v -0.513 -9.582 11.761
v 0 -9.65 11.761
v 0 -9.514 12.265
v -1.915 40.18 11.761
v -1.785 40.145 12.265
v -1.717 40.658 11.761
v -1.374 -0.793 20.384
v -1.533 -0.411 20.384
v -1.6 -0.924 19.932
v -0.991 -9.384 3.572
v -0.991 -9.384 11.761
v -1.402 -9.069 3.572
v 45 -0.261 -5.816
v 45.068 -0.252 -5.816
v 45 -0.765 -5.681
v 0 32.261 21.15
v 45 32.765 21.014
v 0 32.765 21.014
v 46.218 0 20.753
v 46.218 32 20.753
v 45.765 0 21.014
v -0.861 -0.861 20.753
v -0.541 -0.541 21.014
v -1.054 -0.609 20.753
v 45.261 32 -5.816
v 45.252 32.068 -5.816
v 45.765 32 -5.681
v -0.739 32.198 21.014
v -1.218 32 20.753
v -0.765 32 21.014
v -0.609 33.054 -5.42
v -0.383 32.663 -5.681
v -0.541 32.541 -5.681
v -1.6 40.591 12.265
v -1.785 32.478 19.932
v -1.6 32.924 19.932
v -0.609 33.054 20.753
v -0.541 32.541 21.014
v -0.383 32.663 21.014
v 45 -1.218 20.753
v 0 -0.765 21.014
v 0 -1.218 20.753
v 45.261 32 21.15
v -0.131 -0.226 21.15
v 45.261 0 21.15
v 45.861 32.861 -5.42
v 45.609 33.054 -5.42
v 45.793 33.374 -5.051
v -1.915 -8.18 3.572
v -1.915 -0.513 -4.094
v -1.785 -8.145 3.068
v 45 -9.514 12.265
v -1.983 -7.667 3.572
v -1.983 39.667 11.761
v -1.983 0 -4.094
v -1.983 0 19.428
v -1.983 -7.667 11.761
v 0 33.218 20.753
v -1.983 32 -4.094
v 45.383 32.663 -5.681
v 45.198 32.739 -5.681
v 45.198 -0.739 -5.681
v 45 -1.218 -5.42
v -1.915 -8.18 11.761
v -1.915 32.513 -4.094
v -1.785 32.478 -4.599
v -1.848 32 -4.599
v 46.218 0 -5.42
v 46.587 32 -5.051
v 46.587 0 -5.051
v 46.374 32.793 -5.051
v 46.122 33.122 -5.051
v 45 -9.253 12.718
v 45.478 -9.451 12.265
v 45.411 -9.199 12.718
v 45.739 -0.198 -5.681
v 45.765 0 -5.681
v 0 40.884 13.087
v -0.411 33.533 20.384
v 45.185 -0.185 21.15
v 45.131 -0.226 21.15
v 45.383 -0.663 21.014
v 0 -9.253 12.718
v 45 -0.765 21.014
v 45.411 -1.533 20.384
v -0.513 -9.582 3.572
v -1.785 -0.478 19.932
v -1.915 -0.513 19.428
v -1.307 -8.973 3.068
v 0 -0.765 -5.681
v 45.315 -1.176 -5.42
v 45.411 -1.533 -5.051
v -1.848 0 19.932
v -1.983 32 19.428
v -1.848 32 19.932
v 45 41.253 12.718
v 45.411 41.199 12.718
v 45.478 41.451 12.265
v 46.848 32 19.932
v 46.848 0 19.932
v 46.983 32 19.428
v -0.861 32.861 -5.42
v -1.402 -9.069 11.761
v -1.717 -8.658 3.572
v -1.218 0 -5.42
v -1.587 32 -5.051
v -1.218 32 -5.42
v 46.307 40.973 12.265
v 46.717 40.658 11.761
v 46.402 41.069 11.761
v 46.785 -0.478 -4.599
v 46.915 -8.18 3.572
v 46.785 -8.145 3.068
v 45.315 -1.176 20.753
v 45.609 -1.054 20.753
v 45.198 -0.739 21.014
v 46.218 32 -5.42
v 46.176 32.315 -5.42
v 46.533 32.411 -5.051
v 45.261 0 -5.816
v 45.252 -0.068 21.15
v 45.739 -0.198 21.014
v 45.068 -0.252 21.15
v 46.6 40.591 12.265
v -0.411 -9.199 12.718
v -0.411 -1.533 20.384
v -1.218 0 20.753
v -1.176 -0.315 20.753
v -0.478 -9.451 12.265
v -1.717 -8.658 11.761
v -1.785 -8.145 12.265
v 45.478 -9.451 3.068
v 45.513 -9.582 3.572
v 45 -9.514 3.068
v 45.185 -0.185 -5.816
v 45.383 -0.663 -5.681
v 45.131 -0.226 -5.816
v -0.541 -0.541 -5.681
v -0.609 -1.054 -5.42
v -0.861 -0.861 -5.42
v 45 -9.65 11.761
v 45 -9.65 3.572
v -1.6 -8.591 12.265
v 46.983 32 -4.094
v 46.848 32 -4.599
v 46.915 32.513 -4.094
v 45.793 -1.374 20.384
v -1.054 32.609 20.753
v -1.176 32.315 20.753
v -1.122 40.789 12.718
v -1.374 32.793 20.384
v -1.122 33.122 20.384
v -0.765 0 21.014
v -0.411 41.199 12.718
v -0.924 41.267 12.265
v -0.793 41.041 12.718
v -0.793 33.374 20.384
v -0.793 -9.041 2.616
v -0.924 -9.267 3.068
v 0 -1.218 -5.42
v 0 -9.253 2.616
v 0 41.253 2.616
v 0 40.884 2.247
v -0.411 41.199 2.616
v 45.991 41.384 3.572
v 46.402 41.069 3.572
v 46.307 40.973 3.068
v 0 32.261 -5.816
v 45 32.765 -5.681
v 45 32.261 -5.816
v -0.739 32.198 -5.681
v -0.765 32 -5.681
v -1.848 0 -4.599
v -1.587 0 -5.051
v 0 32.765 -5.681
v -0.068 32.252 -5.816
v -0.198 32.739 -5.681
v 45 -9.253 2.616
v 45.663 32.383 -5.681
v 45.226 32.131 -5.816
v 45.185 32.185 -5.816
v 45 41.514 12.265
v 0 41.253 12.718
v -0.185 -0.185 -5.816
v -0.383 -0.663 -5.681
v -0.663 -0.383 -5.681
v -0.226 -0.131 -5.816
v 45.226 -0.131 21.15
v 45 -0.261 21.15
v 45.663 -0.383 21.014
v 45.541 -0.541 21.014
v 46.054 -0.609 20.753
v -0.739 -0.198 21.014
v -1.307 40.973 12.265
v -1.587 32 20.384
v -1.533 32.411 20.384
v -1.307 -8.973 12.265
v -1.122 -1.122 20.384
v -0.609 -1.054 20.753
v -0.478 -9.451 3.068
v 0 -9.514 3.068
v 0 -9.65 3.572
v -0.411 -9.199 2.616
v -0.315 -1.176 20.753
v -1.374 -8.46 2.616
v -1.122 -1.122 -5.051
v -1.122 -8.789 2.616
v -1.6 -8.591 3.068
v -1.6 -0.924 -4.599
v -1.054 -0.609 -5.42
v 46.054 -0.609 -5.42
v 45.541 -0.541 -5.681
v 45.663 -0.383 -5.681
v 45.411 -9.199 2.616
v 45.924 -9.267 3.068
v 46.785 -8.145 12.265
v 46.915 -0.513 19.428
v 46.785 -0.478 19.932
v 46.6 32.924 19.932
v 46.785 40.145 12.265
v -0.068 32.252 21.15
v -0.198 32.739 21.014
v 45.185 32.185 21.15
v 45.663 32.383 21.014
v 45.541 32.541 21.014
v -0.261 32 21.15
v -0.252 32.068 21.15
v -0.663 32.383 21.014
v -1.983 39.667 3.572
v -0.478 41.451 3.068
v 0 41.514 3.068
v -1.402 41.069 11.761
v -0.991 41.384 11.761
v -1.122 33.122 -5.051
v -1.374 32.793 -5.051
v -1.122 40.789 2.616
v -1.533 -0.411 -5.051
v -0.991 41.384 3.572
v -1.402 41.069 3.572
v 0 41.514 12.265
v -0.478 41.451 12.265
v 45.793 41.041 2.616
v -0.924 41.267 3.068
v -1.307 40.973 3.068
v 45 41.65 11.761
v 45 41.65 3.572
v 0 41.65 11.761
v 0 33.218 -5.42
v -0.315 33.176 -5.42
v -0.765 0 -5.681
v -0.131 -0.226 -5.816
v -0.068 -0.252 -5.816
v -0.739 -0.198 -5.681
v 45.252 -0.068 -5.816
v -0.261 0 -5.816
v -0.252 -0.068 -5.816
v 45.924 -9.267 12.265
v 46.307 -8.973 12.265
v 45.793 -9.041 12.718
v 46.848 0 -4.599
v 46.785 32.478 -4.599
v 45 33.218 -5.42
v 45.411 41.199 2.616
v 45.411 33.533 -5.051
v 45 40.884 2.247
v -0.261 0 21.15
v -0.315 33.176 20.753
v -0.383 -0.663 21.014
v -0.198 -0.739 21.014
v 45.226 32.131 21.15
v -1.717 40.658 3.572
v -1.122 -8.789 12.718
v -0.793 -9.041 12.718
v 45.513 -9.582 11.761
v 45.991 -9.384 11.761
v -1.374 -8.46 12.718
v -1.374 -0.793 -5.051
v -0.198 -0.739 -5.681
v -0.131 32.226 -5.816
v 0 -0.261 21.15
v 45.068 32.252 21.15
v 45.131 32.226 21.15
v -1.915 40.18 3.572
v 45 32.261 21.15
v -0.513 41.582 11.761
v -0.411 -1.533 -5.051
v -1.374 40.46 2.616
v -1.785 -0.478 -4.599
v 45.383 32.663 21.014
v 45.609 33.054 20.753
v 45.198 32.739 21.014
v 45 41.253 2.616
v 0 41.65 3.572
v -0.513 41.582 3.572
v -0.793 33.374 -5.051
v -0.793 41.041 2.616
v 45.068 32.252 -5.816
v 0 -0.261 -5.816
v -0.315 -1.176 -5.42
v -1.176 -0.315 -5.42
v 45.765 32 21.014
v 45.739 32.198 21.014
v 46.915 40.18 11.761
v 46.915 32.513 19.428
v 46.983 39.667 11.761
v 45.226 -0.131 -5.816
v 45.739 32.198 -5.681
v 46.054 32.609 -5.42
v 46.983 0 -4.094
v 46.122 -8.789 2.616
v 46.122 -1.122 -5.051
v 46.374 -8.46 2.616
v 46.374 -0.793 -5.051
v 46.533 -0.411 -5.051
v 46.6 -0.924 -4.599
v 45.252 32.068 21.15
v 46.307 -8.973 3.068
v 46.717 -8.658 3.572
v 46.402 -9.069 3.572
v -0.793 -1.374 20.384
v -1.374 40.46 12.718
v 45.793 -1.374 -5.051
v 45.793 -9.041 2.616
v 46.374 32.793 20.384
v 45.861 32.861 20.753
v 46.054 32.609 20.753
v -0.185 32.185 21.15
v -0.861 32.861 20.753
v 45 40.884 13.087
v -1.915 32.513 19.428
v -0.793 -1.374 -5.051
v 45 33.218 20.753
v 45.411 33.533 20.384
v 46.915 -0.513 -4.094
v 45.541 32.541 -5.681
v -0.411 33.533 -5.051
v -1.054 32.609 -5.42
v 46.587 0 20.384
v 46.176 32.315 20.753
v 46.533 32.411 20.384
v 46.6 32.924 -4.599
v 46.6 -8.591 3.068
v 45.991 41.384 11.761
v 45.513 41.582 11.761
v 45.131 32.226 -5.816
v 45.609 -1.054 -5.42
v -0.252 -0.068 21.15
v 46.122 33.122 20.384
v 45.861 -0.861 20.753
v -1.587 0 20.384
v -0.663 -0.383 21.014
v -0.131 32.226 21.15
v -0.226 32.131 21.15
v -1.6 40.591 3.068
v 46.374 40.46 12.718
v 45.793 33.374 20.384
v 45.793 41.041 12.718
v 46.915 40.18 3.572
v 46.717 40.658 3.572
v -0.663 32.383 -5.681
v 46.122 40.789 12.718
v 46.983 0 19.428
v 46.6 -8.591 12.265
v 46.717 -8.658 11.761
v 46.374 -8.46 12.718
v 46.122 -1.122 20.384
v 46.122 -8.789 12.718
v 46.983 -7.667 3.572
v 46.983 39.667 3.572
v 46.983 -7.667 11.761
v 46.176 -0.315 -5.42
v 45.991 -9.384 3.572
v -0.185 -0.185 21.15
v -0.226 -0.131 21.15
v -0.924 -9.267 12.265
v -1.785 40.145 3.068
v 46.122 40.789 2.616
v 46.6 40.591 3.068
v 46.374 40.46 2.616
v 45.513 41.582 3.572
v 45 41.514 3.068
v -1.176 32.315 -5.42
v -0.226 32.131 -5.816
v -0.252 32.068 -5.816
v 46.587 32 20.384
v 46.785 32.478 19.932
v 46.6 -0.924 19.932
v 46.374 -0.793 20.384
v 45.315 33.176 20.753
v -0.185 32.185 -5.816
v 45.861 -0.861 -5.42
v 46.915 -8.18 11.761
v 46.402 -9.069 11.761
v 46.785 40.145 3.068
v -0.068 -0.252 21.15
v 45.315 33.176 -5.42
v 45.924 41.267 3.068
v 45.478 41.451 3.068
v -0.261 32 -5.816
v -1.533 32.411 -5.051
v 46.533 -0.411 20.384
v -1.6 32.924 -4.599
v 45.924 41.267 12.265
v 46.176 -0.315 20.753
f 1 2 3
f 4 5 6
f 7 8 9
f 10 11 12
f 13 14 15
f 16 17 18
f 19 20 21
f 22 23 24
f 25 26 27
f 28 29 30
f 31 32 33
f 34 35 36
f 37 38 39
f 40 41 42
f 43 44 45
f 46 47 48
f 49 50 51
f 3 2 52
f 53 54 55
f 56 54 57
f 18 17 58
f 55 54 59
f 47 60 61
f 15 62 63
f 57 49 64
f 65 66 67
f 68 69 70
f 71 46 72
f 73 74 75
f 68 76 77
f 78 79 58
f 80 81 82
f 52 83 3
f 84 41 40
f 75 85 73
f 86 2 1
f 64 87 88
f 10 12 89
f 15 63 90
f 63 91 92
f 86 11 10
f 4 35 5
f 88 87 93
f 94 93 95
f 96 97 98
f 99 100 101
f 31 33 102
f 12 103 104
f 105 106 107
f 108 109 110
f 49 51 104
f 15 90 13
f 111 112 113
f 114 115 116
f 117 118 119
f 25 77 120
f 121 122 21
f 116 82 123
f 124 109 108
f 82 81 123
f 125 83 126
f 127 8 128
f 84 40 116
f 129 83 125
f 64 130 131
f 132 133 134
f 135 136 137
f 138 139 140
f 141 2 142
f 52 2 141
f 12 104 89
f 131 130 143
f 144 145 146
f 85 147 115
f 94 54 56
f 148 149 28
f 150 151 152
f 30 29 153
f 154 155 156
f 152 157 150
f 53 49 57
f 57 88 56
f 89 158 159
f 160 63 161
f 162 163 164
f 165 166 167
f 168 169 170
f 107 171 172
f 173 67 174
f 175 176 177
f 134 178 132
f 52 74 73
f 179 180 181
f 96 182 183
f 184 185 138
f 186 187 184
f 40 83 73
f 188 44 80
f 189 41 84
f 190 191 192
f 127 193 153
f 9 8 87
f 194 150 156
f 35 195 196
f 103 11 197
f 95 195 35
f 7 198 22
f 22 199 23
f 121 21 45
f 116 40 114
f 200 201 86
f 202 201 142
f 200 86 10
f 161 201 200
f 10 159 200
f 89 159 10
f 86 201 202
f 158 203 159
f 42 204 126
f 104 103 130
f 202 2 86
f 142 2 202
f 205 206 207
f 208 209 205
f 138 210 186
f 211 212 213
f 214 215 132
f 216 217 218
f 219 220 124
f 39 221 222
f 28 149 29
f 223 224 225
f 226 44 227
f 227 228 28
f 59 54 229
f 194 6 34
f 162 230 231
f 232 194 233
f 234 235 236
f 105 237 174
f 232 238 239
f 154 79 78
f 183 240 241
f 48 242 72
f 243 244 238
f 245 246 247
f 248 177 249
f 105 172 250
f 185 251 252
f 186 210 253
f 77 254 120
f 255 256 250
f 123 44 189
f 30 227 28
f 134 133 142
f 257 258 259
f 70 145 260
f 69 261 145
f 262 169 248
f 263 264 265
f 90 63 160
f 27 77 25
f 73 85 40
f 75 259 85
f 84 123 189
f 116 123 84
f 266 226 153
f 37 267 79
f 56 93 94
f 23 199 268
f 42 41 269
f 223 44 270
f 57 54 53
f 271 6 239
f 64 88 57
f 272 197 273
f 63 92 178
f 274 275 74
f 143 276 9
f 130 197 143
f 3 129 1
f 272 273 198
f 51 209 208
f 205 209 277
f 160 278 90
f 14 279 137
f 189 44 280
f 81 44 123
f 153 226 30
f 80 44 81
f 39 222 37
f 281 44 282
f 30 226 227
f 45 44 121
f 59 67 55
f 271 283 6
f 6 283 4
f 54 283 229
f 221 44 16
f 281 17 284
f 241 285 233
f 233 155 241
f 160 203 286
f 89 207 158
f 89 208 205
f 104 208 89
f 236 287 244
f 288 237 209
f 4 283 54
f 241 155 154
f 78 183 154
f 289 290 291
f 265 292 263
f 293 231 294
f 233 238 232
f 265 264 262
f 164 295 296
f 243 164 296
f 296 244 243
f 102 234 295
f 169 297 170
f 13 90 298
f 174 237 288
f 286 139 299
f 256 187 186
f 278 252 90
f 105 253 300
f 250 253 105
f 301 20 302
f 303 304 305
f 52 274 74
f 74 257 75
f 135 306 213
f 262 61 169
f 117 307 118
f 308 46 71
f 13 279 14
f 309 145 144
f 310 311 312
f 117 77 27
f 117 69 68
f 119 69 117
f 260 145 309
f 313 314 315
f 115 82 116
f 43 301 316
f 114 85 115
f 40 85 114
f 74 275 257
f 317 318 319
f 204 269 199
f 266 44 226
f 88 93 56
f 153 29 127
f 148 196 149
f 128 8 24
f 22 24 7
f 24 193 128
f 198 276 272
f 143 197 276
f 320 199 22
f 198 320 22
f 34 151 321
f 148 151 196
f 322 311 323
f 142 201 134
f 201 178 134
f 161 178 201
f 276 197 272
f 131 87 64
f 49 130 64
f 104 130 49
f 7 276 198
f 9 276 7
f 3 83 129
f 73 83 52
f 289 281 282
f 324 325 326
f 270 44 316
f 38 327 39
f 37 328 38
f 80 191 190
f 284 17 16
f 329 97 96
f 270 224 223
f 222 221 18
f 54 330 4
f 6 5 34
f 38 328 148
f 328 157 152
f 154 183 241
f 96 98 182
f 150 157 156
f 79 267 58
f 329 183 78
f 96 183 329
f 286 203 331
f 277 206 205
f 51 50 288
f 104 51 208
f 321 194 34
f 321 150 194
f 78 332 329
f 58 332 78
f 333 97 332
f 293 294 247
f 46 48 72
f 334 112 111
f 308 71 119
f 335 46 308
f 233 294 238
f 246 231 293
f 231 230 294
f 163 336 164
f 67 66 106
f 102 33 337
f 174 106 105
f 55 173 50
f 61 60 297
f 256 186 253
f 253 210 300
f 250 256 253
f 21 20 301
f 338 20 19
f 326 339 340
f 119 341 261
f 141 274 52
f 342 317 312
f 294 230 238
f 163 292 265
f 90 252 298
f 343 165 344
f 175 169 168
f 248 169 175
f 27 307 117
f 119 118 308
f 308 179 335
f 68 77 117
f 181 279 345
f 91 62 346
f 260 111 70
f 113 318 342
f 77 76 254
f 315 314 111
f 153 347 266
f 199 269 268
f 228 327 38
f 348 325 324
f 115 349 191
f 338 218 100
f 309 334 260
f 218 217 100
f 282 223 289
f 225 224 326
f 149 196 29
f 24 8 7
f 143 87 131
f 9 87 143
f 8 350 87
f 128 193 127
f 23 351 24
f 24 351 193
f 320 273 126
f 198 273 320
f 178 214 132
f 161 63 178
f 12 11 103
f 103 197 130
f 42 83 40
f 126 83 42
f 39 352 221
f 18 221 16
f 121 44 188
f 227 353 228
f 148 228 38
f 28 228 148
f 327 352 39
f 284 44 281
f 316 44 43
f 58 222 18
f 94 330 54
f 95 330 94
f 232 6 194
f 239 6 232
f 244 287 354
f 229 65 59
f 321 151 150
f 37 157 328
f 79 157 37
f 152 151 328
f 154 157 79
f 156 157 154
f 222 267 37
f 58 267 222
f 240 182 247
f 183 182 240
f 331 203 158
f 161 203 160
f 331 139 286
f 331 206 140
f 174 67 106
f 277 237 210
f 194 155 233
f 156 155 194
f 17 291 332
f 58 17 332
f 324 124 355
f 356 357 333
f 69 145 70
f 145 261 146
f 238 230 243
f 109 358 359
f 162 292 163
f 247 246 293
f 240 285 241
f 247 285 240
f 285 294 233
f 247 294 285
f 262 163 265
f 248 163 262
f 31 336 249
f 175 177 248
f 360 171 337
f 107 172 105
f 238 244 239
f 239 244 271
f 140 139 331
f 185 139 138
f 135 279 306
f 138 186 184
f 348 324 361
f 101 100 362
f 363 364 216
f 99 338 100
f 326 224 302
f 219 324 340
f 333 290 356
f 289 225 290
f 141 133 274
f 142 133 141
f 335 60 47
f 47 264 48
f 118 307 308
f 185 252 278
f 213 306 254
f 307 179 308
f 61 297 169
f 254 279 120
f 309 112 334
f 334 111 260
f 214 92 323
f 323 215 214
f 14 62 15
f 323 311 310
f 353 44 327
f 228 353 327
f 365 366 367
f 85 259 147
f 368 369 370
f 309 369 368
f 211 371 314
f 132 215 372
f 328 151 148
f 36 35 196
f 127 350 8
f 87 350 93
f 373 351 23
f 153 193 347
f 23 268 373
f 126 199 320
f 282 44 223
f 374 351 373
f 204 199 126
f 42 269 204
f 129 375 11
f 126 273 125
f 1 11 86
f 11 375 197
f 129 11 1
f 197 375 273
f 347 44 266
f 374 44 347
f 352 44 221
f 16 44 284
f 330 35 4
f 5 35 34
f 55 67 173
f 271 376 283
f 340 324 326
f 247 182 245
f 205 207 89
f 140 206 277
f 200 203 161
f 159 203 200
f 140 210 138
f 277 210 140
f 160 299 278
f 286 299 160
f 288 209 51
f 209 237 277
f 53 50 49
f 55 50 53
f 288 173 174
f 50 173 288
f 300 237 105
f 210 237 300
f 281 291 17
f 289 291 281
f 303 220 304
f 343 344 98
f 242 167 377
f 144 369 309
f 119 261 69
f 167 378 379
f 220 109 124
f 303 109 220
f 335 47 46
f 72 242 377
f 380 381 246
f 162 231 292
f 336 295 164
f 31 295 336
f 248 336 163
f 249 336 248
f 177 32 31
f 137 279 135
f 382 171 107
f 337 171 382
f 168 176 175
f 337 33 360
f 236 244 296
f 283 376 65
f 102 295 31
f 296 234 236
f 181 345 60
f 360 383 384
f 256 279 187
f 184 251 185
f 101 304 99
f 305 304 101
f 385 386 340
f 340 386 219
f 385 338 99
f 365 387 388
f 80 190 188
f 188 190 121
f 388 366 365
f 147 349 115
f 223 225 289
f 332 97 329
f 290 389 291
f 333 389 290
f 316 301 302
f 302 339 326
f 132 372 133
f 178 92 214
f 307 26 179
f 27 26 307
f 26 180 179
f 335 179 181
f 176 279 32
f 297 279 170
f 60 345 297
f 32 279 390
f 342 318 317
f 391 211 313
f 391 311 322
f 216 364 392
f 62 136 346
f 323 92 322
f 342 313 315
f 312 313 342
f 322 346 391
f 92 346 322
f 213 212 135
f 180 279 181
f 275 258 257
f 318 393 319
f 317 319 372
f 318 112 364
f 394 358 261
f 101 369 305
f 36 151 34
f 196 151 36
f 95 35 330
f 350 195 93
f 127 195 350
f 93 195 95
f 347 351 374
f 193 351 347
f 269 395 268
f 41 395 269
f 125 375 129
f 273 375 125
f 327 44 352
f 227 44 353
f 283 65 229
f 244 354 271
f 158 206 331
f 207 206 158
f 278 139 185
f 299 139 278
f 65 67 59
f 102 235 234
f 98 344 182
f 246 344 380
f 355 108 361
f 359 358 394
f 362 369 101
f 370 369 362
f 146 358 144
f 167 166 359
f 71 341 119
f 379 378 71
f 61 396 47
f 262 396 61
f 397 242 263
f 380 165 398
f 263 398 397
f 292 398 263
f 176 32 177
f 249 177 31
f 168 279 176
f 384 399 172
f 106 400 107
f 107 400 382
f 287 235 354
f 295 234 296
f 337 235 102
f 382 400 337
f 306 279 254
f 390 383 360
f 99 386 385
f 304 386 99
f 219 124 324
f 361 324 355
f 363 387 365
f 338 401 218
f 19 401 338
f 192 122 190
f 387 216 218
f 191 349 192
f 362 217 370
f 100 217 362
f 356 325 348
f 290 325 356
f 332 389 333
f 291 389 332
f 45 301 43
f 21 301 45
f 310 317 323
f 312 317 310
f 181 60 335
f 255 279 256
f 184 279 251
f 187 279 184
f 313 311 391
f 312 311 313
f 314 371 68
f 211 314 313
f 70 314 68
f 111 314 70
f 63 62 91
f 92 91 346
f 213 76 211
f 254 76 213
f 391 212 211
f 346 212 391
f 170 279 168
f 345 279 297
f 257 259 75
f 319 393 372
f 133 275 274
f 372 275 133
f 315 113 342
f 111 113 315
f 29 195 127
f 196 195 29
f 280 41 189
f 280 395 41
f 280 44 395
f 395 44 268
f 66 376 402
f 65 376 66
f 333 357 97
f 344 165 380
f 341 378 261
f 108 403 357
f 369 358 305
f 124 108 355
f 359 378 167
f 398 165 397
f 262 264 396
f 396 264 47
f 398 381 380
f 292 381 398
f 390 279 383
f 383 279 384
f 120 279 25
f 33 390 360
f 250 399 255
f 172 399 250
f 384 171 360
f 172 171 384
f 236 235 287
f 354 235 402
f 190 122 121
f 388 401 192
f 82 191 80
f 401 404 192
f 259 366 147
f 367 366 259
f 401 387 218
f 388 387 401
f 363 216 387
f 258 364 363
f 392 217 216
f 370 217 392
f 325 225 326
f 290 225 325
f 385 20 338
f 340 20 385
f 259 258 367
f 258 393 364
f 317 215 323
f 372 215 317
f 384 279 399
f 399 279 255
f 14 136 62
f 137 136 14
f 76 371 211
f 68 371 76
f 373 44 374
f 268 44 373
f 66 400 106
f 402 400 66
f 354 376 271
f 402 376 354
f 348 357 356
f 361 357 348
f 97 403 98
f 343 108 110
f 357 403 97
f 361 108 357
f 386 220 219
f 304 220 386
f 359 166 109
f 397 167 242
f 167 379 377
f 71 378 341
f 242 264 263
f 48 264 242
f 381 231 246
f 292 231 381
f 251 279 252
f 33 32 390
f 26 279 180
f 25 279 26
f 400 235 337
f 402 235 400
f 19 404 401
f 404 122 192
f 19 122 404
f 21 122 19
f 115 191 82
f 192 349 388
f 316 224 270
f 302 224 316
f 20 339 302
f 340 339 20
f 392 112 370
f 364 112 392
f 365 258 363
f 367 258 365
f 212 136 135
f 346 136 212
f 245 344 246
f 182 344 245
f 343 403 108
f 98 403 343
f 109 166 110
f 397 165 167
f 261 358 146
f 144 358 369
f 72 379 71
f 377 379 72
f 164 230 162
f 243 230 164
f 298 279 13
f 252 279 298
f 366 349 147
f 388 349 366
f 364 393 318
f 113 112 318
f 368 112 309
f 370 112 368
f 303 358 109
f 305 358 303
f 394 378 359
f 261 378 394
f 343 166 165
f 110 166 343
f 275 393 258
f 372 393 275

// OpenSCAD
$fn = 24; 

//length, width, height
rounded_box([45, 32, 23], 2);
//basic_shape([45, 32, 23], 2);

module rounded_box(size, radius) {
    minkowski()     {
        basic_shape(size);
        sphere(r=radius);
    }
}


module basic_shape(size) {
    //cube(size);
    translate([0, -size[2]/3, size[2]/3]) rotate([0, 90, 0]) linear_extrude(height=size[0]) 
        profile_oct(size);
}


module profile_oct(size) {
    hull() {
        translate([-size[2]/2, size[2]/3, 0]) 
            square([size[2], size[1]]);
        translate([-size[2]/6, 0, 0]) 
            square([size[2]/3, size[2]/3]);
        translate([-size[2]/6, size[2]/3+size[1], 0]) 
            square([size[2]/3, size[2]/3]);
    }
}


module profile_hex(size) {
    hull() {
        rotate([0, 0, 45])
            square(size[2]/sqrt(2));
        translate([0, size[1], 0]) 
            rotate([0, 0, 45])
                square(size[2]/sqrt(2));
    }
}
